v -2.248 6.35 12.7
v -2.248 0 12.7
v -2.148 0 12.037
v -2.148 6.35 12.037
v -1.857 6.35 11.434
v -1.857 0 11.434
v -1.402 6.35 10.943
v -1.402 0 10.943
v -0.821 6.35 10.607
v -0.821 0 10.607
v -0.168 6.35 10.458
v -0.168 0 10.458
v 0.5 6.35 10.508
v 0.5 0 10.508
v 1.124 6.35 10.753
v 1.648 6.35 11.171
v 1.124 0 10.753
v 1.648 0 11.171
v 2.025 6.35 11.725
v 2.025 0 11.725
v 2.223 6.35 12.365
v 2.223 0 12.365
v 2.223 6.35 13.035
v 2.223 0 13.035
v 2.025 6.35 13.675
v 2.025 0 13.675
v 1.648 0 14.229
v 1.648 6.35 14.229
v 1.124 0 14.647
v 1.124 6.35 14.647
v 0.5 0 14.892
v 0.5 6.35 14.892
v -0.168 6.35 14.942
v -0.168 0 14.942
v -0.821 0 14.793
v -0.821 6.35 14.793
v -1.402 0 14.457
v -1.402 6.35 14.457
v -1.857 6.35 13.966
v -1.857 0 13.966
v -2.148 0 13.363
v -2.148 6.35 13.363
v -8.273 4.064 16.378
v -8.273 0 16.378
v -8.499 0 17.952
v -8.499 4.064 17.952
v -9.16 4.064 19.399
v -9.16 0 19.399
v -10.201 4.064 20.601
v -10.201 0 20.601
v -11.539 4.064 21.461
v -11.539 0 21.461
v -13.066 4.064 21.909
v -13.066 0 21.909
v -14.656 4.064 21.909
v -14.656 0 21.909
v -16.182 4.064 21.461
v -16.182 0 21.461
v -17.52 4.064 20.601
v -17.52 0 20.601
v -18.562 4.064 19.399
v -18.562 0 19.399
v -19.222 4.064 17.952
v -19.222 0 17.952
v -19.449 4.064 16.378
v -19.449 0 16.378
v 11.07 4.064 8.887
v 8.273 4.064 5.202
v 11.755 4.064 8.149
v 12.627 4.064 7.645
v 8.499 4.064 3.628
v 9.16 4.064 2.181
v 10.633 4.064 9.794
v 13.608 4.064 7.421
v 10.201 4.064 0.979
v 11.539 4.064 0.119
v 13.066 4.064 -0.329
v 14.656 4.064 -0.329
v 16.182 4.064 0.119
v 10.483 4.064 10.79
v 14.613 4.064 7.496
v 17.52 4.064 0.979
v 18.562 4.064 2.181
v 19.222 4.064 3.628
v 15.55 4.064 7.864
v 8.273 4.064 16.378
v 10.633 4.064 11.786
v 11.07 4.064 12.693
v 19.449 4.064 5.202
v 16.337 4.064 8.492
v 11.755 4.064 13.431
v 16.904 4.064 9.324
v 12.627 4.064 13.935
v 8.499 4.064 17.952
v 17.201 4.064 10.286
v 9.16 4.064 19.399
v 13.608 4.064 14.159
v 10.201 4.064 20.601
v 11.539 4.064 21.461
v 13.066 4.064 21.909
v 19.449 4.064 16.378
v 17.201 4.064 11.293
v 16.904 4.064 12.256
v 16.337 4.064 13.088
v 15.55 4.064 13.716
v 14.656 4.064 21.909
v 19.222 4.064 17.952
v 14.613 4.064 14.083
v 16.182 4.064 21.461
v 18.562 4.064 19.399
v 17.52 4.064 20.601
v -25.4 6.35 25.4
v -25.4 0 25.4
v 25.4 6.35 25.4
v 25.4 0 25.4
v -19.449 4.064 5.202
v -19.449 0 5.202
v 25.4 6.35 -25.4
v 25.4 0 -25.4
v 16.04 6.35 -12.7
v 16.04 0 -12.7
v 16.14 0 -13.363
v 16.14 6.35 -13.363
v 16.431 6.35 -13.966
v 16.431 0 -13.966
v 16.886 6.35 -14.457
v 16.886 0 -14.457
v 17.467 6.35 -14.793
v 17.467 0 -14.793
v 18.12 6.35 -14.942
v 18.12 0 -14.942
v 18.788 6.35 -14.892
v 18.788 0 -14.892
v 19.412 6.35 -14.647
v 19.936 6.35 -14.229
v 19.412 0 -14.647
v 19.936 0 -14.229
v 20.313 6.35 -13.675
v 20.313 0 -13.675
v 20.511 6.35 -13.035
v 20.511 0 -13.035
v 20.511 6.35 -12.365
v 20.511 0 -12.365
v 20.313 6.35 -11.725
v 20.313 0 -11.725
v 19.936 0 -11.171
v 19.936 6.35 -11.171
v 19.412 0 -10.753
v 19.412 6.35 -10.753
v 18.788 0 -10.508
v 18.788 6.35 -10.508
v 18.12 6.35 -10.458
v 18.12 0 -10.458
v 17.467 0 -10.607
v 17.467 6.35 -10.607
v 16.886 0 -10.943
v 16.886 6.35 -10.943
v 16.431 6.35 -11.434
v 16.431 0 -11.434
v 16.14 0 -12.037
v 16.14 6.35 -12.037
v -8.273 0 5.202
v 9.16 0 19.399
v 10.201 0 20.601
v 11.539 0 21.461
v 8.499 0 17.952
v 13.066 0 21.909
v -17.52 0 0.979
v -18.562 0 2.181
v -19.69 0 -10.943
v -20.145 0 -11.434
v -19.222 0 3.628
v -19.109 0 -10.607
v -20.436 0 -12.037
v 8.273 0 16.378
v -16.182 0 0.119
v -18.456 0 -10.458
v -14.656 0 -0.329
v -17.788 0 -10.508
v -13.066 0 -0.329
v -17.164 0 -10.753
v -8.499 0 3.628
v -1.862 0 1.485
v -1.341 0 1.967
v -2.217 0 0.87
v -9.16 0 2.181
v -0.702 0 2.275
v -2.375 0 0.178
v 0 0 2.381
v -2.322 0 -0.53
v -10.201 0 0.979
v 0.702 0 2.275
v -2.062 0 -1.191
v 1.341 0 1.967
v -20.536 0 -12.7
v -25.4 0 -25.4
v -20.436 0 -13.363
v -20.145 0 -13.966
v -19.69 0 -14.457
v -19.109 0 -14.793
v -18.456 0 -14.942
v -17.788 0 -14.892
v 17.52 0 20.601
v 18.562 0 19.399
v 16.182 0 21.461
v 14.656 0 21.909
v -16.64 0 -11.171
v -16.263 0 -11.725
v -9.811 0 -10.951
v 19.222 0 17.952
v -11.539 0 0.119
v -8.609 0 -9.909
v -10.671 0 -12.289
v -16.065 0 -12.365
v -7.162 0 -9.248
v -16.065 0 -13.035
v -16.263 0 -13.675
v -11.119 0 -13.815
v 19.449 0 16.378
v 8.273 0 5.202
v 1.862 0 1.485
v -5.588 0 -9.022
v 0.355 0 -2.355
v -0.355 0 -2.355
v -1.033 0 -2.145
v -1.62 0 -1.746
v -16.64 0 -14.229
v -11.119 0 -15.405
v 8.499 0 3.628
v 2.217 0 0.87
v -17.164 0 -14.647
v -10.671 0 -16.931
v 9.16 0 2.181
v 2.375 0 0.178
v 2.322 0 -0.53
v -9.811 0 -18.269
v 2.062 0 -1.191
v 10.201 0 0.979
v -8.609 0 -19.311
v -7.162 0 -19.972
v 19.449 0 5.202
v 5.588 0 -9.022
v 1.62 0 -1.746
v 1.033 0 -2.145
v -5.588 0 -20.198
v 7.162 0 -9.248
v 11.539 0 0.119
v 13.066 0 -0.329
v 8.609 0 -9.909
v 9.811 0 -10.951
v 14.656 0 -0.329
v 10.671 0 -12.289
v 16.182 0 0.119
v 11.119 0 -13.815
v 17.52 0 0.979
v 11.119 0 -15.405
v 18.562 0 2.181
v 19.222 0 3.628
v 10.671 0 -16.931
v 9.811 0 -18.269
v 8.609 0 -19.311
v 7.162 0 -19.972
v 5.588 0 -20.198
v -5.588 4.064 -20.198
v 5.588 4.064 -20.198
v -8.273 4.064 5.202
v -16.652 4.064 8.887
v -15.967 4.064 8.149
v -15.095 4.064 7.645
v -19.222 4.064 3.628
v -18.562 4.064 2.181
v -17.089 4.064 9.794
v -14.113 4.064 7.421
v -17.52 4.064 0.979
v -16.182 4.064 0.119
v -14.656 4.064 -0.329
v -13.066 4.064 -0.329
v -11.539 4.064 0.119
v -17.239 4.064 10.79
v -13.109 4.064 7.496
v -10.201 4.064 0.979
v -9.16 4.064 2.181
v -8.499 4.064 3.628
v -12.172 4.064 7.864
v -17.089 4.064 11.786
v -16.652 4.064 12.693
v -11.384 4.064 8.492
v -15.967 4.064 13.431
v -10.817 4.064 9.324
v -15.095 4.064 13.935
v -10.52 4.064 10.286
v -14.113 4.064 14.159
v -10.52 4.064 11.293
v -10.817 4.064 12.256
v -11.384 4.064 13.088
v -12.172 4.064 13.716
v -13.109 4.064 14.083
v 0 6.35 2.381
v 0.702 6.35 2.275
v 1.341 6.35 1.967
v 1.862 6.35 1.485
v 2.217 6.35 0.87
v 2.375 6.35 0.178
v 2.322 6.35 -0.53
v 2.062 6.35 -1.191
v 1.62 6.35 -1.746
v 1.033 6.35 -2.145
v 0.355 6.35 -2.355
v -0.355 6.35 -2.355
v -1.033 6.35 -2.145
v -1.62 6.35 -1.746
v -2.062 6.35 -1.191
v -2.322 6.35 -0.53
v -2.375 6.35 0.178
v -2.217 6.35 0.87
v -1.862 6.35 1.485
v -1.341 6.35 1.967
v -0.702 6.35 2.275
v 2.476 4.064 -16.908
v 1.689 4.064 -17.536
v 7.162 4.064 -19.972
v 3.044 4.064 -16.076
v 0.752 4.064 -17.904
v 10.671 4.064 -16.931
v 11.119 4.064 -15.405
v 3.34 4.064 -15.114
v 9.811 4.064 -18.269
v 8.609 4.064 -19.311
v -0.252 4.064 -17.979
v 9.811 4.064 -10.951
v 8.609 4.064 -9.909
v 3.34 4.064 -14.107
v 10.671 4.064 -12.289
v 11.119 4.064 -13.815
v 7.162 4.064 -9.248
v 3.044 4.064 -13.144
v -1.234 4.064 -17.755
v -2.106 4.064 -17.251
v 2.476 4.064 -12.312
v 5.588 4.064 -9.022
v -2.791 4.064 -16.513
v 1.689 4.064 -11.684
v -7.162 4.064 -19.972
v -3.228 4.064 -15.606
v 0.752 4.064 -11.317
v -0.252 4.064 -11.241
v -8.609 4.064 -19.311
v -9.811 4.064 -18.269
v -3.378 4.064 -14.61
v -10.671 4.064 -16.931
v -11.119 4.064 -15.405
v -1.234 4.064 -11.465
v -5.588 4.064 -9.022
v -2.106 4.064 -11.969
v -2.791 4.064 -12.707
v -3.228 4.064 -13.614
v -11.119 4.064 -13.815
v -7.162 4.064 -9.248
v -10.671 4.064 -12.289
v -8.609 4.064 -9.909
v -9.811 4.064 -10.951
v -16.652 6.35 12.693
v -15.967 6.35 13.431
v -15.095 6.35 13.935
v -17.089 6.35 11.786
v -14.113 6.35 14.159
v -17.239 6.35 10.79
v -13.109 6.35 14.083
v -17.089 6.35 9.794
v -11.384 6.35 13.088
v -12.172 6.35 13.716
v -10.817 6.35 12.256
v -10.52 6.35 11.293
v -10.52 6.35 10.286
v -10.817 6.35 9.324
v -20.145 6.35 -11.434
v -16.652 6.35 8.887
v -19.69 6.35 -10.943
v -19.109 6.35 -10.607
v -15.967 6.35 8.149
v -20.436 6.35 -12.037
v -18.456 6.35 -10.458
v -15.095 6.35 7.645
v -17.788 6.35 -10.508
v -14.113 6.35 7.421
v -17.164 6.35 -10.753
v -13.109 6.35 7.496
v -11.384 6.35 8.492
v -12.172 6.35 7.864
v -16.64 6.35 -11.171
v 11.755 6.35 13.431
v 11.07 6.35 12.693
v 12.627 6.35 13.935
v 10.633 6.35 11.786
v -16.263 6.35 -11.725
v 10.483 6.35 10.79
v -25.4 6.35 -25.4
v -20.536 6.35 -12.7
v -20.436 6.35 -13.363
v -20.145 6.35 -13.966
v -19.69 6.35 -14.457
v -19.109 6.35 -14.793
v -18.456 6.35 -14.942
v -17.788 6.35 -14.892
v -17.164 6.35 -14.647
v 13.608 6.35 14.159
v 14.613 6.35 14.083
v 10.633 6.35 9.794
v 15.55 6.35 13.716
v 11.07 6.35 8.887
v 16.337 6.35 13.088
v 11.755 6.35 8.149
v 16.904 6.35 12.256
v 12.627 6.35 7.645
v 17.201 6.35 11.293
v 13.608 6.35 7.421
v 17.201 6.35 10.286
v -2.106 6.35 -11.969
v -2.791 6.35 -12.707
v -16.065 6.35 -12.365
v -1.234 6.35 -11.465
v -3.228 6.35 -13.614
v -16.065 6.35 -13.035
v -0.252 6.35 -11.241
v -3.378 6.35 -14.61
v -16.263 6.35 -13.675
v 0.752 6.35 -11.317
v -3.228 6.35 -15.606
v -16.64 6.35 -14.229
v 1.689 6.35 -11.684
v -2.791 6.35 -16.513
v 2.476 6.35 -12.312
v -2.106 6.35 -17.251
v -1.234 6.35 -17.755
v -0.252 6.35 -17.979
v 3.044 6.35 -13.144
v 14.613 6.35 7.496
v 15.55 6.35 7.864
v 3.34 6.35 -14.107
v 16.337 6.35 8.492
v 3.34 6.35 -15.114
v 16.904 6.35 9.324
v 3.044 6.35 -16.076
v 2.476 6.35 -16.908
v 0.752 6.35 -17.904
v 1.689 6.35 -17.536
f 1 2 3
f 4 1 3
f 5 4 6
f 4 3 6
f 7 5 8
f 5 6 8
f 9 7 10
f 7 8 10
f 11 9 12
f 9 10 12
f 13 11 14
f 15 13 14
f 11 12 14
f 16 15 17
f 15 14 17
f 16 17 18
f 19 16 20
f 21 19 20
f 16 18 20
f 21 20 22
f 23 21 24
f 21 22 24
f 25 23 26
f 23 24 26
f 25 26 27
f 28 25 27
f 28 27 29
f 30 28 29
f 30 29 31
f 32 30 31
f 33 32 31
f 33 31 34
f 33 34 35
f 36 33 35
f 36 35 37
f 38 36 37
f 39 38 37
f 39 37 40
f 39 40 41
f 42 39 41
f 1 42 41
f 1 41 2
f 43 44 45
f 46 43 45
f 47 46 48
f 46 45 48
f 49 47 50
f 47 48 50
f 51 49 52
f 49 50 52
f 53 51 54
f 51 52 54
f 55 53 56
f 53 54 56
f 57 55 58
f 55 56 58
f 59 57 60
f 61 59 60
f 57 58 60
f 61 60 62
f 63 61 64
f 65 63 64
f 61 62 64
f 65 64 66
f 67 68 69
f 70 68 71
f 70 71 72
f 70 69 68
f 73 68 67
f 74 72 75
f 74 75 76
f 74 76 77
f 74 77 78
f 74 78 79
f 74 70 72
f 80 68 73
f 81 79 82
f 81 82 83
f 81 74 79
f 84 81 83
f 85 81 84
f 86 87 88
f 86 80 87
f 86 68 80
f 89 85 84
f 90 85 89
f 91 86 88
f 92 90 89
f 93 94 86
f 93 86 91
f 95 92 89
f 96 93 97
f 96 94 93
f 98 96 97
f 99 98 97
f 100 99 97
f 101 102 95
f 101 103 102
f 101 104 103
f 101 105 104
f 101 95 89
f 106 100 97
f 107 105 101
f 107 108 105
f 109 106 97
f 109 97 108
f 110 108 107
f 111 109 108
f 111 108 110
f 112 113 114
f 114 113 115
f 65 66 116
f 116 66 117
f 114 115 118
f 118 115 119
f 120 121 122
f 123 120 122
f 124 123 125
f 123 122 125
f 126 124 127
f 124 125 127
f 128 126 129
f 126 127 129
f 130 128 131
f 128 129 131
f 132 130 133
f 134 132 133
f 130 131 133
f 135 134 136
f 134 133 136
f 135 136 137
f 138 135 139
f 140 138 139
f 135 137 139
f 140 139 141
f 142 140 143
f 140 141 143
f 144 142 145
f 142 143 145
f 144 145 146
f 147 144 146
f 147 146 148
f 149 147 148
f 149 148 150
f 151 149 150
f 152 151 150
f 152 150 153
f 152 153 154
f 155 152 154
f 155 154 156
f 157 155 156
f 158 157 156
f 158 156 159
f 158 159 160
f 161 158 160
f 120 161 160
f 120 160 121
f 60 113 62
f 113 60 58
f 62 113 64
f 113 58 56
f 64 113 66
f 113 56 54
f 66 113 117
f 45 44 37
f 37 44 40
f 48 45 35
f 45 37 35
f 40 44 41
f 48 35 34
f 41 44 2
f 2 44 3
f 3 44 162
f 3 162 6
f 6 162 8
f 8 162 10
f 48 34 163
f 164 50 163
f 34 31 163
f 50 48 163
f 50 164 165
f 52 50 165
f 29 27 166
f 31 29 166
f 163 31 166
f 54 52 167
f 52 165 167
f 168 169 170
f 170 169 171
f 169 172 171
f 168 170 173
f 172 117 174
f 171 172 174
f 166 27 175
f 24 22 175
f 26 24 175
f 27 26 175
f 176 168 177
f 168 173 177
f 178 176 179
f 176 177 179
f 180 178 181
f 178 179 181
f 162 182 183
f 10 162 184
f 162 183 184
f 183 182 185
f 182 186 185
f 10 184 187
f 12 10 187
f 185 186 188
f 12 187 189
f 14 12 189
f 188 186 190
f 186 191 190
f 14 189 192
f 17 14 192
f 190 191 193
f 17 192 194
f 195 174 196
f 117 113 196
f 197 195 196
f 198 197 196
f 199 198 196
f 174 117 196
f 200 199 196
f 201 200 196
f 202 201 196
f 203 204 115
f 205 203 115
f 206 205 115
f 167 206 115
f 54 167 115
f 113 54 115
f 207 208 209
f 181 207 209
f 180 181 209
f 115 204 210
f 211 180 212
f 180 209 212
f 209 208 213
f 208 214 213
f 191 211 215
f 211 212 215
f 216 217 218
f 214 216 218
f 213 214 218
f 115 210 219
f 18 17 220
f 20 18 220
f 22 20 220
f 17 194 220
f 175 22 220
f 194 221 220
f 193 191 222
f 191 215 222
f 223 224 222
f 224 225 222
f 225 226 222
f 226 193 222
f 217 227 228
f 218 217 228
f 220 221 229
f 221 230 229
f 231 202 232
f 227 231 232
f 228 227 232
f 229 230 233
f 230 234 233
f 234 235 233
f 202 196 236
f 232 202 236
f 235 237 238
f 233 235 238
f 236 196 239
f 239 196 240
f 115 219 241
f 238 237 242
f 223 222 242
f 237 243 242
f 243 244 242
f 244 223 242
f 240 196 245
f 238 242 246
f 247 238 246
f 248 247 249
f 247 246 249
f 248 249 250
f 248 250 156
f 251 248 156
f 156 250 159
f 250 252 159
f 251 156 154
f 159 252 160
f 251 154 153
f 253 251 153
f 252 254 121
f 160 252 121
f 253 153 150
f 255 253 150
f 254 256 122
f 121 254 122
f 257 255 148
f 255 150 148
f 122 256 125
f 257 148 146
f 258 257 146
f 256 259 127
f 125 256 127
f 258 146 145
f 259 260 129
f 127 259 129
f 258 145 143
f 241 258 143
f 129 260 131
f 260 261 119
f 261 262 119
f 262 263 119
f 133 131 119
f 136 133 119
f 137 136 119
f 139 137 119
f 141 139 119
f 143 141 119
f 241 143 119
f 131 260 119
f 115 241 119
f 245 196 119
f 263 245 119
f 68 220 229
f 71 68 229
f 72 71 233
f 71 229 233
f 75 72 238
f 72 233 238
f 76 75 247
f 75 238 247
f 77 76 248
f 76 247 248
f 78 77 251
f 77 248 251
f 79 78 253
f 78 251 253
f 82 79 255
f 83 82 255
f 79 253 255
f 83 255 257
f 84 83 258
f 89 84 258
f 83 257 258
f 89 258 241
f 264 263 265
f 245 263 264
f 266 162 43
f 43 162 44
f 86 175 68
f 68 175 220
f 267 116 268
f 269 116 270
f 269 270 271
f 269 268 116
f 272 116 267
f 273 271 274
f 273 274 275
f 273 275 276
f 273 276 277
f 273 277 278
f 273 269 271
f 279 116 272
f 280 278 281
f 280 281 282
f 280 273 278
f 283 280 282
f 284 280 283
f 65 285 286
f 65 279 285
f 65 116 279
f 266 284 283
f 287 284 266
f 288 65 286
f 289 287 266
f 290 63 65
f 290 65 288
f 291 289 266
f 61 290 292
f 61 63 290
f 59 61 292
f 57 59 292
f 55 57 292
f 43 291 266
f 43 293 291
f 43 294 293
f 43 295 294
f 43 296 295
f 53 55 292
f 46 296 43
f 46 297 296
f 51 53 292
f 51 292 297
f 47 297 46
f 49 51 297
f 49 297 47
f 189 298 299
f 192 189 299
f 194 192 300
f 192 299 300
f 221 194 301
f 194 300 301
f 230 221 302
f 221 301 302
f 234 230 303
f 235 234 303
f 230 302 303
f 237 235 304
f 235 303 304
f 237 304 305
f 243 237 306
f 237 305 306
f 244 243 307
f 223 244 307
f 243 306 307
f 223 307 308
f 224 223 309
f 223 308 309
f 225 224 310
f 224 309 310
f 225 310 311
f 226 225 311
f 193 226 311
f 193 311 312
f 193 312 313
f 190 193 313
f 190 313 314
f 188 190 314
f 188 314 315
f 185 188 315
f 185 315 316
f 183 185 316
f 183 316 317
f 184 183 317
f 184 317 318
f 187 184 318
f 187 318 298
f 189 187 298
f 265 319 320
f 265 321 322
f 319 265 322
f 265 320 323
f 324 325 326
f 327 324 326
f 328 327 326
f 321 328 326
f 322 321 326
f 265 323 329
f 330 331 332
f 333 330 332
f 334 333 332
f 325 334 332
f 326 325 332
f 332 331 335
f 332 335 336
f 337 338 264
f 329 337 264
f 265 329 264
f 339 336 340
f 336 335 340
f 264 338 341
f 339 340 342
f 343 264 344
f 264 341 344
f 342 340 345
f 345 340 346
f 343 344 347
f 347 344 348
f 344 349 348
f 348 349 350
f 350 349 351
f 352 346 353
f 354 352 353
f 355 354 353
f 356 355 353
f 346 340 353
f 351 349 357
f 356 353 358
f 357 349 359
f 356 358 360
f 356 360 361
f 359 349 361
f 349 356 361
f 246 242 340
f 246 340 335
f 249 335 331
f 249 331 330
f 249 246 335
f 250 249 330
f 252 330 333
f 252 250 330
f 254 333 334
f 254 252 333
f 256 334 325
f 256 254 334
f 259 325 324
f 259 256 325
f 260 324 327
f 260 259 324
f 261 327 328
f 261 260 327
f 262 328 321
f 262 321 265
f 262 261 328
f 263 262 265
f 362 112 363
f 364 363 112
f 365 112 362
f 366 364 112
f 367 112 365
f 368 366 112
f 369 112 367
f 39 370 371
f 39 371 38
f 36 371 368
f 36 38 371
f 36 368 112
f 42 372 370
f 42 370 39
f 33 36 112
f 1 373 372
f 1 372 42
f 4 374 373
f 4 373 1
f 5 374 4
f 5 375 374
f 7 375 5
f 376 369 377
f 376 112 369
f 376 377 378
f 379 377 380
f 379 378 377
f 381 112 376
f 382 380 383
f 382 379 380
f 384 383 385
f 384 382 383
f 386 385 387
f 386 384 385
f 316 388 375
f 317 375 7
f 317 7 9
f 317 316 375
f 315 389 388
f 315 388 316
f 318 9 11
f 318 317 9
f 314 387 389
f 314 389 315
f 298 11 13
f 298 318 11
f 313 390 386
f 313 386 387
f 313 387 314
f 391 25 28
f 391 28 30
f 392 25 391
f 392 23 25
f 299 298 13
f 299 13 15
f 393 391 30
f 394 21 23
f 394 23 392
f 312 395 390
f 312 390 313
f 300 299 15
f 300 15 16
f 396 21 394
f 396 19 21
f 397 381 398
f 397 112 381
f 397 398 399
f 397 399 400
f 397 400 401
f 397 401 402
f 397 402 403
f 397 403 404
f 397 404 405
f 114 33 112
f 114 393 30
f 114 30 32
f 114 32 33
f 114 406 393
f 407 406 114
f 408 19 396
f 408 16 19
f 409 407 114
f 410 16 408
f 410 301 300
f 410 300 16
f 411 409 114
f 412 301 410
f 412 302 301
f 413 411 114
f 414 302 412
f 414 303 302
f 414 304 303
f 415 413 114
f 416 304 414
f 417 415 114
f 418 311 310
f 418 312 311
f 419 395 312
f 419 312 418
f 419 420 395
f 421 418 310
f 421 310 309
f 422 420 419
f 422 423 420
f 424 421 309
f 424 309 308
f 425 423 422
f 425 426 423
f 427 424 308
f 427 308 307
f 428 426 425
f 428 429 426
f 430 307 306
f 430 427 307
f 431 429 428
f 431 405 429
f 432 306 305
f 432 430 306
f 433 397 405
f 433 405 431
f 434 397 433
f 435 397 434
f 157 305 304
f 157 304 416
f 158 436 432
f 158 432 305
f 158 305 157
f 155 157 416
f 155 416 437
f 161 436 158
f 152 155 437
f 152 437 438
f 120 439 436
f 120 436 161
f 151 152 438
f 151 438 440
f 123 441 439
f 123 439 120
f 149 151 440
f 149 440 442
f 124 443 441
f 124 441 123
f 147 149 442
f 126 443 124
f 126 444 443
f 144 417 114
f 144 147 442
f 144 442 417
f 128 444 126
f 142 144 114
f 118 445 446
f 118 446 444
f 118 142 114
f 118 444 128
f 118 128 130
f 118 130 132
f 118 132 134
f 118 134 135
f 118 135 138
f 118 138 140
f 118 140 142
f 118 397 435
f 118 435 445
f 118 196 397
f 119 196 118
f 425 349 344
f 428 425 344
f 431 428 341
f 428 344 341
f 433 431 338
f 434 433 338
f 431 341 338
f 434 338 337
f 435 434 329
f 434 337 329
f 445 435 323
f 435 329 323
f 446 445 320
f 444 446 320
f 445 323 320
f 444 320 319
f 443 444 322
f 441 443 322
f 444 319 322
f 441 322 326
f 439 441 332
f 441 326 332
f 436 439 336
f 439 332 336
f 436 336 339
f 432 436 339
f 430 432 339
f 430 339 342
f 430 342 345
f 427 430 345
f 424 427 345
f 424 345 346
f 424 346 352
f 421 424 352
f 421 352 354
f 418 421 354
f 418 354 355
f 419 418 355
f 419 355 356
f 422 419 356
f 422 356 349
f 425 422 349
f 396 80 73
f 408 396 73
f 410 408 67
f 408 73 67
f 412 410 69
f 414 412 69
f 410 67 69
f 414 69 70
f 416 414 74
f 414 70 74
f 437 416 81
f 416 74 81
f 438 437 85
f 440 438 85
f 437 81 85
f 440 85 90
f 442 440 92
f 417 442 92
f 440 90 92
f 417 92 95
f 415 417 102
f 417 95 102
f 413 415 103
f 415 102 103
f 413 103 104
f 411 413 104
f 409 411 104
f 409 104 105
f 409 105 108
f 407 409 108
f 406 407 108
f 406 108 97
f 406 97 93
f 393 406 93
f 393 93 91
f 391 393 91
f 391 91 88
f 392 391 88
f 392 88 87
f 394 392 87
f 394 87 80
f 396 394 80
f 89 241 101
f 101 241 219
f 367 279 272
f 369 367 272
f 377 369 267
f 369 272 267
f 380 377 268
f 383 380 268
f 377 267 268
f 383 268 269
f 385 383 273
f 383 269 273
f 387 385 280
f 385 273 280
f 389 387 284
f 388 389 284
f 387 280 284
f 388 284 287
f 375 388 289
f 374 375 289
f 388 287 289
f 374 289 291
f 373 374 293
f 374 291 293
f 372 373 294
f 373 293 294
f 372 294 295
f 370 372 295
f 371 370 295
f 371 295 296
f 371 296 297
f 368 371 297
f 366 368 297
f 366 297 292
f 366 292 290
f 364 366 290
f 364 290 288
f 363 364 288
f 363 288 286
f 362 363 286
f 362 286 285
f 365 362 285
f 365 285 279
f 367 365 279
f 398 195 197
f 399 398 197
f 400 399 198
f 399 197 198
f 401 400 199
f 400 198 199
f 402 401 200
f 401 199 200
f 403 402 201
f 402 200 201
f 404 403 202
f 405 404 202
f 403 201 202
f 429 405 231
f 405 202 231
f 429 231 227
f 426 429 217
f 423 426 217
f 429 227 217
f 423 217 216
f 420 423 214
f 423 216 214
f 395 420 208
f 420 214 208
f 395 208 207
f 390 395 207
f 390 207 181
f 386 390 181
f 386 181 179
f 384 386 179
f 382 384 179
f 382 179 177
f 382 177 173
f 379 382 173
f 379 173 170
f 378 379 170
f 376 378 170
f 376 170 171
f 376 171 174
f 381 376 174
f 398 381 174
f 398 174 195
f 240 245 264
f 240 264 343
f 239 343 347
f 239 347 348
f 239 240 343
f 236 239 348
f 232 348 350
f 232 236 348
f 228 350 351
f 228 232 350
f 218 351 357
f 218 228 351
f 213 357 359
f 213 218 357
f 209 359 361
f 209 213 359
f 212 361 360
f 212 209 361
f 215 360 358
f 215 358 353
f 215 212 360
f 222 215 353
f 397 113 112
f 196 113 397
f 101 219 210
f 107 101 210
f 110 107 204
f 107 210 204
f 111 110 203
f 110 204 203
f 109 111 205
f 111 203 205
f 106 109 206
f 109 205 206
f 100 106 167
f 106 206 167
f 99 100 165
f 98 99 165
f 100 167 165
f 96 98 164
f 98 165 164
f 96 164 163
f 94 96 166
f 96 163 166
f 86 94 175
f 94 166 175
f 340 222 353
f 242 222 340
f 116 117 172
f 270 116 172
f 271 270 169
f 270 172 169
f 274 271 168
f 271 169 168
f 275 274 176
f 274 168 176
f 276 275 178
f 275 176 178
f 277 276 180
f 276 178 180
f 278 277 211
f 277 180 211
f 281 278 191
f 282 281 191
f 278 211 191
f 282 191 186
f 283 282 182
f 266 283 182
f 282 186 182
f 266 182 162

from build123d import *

# Parameters (mm, degrees)
SKETCH1_W               = 50.8
SKETCH1_H               = 50.8
BOSS_EXTRUDE1_DEPTH     = 6.35
F_8_CLEARANCE_HOLE1_D   = 4.4958
F_1_4_CLEARANCE_HOLE1_D = 6.7564
CUT_EXTRUDE1_DEPTH      = 4.064
SKETCH9_R               = 2.38125
CUT_EXTRUDE2_DEPTH      = 37.477972806


with BuildPart() as part:
    # Sketch1 → Boss-Extrude1 (new body)
    with BuildSketch(Plane(origin=(0, 0, 0), x_dir=(1, 0, 0), z_dir=(0, 1, 0))):
        Rectangle(SKETCH1_W, SKETCH1_H)
    extrude(amount=BOSS_EXTRUDE1_DEPTH)

    # #8 Clearance Hole1 (through all)
    with Locations(Plane(origin=(0, 6.35, 0), x_dir=(1, 0, 0), z_dir=(0, 1, 0))):
        with Locations((-18.288, 12.7), (18.288, 12.7), (0, -12.7)):
            Hole(F_8_CLEARANCE_HOLE1_D / 2)

    # 1/4 Clearance Hole1 (through all)
    with Locations(Plane(origin=(0, 6.35, 0), x_dir=(1, 0, 0), z_dir=(0, 1, 0))):
        with Locations((0, 14.61008), (-13.86078, -10.78992), (13.86078, -10.78992)):
            Hole(F_1_4_CLEARANCE_HOLE1_D / 2)

    # Sketch8 → Cut-Extrude1 (cut)
    with BuildSketch(Plane.XZ):
        with BuildLine():
            Line((-19.44878, 16.37792), (-19.44878, 5.20192))
            ThreePointArc((-19.44878, 5.20192), (-13.86078, -0.38608), (-8.27278, 5.20192))
            Line((-8.27278, 5.20192), (-8.27278, 16.37792))
            ThreePointArc((-8.27278, 16.37792), (-13.86078, 21.96592), (-19.44878, 16.37792))
        make_face()
        with BuildLine():
            Line((8.27278, 16.37792), (8.27278, 5.20192))
            ThreePointArc((8.27278, 5.20192), (13.86078, -0.38608), (19.44878, 5.20192))
            Line((19.44878, 5.20192), (19.44878, 16.37792))
            ThreePointArc((19.44878, 16.37792), (13.86078, 21.96592), (8.27278, 16.37792))
        make_face()
        with BuildLine():
            Line((-5.588, -9.02208), (5.588, -9.02208))
            ThreePointArc((5.588, -9.02208), (11.176, -14.61008), (5.588, -20.19808))
            Line((5.588, -20.19808), (-5.588, -20.19808))
            ThreePointArc((-5.588, -20.19808), (-11.176, -14.61008), (-5.588, -9.02208))
        make_face()
    extrude(amount=-CUT_EXTRUDE1_DEPTH, mode=Mode.SUBTRACT)

    # Sketch9 → Cut-Extrude2 (cut, through all)
    with BuildSketch(Plane(origin=(0, 6.35, 0), x_dir=(1, 0, 0), z_dir=(0, 1, 0))):
        with Locations(Location((0, 0, 0), (0, 0, 270))):
            Circle(SKETCH9_R)
    extrude(amount=-CUT_EXTRUDE2_DEPTH, mode=Mode.SUBTRACT)


solid = part.part
